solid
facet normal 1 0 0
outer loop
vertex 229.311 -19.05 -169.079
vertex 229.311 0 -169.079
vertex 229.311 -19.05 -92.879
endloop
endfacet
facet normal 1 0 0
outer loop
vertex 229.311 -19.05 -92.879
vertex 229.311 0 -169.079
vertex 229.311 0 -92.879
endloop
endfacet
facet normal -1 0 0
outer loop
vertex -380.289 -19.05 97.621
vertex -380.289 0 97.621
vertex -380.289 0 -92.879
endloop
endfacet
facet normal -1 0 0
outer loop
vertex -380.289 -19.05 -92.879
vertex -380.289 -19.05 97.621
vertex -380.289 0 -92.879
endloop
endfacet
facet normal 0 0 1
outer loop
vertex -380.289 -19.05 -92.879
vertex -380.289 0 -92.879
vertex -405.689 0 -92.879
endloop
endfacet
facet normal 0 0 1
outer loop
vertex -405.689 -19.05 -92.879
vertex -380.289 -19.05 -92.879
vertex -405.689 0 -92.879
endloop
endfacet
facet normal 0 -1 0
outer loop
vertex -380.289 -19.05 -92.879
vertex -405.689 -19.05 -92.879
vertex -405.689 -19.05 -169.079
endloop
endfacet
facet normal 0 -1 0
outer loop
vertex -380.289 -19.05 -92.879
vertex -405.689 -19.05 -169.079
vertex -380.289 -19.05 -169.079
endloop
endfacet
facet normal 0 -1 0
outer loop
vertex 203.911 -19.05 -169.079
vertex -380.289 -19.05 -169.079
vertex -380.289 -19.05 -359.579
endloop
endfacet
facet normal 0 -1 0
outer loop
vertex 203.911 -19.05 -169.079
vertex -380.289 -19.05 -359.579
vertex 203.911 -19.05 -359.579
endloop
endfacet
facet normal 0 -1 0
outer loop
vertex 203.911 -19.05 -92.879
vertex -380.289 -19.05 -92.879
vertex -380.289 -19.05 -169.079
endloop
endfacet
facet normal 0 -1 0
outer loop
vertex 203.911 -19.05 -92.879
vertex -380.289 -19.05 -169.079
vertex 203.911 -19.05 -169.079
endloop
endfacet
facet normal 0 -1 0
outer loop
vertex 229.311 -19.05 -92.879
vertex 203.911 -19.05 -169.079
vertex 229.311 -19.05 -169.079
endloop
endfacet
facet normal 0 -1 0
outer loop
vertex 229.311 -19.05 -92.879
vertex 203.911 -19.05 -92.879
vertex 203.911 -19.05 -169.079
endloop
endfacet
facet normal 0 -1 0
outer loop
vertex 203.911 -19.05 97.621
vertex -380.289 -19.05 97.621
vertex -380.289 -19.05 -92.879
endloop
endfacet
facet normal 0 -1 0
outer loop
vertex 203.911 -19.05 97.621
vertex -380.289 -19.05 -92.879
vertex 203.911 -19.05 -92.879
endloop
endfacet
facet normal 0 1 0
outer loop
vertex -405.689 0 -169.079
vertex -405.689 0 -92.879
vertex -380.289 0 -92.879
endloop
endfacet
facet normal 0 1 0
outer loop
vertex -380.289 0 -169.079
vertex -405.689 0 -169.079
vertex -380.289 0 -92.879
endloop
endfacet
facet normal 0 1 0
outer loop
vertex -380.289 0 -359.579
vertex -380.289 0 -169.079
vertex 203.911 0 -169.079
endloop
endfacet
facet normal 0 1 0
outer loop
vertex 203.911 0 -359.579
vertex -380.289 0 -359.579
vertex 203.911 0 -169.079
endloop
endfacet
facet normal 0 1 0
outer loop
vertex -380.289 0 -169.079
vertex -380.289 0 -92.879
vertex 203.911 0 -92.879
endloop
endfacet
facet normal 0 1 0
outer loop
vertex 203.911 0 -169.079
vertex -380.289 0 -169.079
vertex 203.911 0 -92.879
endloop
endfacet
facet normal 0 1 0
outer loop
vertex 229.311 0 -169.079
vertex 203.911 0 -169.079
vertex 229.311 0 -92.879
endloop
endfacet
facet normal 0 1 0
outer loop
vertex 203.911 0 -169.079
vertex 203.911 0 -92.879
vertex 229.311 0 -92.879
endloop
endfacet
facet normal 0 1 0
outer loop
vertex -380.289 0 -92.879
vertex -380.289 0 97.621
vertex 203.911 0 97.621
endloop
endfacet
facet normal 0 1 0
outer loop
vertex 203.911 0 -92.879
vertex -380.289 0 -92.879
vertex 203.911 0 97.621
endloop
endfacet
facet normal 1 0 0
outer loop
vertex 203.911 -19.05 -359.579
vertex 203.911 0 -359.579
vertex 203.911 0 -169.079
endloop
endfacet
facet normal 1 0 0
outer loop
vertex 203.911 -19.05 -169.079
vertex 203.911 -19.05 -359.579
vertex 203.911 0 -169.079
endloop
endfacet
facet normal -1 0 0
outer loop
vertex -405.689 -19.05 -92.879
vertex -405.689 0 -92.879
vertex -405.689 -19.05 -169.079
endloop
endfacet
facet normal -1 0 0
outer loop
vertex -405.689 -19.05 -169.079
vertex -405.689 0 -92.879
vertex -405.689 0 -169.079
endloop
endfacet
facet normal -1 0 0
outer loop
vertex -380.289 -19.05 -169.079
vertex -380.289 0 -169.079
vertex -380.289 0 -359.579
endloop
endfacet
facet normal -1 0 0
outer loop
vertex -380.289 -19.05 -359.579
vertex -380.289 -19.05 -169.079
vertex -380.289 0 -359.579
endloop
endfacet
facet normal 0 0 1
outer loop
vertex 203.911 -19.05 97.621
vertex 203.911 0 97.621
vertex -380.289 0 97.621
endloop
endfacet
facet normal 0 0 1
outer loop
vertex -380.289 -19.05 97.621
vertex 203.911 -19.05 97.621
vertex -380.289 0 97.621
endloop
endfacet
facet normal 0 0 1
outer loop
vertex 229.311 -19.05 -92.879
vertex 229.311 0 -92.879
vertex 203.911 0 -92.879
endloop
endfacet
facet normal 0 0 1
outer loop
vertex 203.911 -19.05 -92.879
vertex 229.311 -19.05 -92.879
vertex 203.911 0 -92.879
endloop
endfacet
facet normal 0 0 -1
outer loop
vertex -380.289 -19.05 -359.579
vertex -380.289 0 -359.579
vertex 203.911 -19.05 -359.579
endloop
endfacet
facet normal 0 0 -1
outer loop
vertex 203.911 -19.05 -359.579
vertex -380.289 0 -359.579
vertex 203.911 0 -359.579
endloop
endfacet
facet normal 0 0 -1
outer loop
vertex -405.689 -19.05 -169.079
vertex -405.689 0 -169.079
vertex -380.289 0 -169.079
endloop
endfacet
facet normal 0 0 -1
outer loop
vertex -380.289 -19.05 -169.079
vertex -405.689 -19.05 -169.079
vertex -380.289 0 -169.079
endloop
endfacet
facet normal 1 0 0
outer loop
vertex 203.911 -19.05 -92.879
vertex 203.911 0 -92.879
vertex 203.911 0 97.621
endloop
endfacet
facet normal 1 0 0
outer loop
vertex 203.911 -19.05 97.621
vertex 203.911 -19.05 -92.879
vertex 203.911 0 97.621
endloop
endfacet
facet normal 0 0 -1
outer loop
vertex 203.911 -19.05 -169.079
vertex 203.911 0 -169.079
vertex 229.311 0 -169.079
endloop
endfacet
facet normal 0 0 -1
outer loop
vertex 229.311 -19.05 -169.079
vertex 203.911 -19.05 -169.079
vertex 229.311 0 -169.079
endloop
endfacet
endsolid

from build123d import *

# Parameters (mm, degrees)
F1_DEPTH = 19.05


with BuildPart() as f1:
    # F0 (on Front) → F1 (new body)
    with BuildSketch(Plane.XZ):
        Polygon((203.910831, 97.620917), (-380.289169, 97.620917), (-380.289169, -92.879083), (-380.289169, -169.079083), (-380.289169, -359.579083), (203.910831, -359.579083), (203.910831, -169.079083), (203.910831, -92.879083), align=None)
        Polygon((-380.289169, -169.079083), (-380.289169, -92.879083), (-405.689169, -92.879083), (-405.689169, -130.979083), (-405.689169, -169.079083), align=None)
        Polygon((229.310831, -92.879083), (203.910831, -92.879083), (203.910831, -169.079083), (229.310831, -169.079083), (229.310831, -130.979083), align=None)
    extrude(amount=F1_DEPTH)


solid = f1.part
